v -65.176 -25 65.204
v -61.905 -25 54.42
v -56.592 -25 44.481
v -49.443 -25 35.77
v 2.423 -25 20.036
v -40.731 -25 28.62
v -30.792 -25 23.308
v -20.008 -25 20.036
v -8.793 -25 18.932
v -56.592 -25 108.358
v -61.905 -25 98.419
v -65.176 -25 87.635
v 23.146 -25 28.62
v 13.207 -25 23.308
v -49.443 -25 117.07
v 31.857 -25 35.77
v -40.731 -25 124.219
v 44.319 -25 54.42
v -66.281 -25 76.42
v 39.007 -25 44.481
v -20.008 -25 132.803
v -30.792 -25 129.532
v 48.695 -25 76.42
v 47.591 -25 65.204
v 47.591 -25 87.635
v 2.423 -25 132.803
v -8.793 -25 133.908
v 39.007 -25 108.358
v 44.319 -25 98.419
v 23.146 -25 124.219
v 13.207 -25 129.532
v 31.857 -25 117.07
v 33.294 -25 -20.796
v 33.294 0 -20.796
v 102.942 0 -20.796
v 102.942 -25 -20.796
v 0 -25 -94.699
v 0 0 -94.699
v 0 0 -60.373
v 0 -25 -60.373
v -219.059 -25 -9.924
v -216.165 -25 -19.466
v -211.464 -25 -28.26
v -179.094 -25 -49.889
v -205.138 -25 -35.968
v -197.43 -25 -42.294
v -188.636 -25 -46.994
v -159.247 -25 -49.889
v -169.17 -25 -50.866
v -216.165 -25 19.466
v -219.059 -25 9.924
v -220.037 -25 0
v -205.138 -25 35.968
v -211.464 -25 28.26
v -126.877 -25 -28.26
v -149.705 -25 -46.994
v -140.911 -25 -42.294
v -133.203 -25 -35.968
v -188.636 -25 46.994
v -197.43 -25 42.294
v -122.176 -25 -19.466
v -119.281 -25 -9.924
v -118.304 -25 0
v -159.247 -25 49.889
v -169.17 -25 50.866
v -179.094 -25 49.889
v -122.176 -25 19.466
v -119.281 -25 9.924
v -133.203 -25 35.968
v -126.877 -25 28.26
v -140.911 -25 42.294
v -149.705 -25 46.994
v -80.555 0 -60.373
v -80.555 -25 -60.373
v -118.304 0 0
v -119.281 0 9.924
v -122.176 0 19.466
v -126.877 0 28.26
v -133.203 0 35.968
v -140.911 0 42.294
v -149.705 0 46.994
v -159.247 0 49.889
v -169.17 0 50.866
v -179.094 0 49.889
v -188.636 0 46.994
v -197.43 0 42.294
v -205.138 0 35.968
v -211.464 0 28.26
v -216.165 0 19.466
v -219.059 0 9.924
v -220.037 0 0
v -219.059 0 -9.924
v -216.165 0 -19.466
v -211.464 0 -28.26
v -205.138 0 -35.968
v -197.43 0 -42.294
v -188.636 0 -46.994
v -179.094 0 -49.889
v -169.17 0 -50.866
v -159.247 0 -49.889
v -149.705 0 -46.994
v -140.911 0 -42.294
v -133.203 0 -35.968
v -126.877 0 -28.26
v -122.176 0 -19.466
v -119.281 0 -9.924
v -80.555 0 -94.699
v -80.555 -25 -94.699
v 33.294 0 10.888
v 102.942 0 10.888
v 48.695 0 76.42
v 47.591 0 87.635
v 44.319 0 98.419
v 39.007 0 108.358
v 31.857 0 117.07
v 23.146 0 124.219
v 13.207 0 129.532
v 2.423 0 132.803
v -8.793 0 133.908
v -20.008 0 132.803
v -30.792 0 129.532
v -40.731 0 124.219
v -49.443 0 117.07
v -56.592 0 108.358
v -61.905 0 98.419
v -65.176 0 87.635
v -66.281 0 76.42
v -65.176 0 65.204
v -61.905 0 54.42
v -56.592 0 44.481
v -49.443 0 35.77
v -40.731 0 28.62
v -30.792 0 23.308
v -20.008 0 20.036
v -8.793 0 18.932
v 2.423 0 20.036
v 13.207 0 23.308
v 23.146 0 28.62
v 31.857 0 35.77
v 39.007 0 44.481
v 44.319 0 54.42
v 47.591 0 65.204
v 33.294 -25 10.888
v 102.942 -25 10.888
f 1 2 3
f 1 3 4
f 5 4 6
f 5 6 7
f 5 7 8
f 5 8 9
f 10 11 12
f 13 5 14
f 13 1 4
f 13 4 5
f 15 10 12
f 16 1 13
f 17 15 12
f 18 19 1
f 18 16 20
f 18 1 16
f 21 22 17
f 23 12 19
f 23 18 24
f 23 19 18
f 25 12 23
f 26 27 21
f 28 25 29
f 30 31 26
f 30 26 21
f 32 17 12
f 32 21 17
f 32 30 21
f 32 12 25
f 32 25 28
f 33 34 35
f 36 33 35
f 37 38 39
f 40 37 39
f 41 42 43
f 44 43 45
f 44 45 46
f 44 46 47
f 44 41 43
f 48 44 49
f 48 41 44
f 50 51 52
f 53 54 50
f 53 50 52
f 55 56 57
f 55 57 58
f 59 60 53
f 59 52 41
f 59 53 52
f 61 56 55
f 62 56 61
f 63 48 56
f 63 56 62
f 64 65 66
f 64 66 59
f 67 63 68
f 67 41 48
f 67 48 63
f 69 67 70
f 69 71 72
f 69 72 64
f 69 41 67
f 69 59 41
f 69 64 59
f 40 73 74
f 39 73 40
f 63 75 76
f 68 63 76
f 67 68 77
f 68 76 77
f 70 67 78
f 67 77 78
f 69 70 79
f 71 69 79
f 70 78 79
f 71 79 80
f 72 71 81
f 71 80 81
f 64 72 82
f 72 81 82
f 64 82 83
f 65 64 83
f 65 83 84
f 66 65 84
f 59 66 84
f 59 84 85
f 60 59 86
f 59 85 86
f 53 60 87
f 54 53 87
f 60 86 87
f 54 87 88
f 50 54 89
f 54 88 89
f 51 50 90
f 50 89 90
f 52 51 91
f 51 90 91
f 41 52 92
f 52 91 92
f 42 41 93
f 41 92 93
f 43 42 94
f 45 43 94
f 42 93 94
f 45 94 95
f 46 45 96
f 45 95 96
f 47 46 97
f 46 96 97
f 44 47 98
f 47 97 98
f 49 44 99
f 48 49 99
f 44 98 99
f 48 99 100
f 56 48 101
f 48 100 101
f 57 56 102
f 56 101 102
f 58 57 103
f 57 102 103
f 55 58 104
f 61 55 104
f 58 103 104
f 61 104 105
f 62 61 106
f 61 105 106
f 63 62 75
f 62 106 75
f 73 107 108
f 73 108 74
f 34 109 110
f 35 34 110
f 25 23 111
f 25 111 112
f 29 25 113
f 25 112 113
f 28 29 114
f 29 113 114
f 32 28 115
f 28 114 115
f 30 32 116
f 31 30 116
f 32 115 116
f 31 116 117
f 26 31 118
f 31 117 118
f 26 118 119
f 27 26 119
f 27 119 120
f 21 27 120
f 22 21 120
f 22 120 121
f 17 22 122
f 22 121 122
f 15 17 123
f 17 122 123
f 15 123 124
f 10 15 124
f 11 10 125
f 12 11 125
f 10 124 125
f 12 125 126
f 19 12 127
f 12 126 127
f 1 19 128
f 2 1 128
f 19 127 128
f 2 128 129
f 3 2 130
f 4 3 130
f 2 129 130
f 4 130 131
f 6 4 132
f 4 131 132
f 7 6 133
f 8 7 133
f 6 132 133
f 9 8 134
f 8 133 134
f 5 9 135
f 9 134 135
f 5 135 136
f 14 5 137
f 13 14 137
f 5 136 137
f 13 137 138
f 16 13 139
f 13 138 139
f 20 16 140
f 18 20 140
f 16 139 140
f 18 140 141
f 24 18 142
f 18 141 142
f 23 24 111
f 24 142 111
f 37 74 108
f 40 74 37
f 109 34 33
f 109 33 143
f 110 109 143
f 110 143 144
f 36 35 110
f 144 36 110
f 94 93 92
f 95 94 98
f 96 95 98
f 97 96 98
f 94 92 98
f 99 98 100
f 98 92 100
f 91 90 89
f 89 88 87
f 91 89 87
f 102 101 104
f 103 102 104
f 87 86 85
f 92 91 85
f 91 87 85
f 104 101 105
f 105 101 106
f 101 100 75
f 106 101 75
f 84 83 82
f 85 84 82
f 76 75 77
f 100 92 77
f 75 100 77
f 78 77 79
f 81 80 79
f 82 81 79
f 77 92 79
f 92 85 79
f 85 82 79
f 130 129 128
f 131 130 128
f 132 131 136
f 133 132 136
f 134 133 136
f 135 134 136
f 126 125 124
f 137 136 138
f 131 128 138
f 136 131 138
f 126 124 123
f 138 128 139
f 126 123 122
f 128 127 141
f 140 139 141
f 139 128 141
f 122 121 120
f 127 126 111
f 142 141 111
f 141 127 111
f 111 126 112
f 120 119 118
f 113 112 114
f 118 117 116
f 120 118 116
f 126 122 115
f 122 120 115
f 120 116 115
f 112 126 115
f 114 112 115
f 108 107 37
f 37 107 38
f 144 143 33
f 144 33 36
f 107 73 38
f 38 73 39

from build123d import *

# Parameters (mm, degrees)
F0_R     = 50.866382
F0_R_2   = 57.48797
F2_W     = 69.648493
F2_H     = 31.684121
F1_W     = 80.554798
F1_H     = 34.325894
F3_DEPTH = 25


with BuildPart() as f3:
    # F0 (on Front) + F2 (on Front) + F1 (on Front) → F3 (new body)
    with BuildSketch(Plane.XZ):
        with Locations((-169.170484, 0)):
            Circle(F0_R)
        with Locations((-8.792641, 76.419741)):
            Circle(F0_R_2)
    with BuildSketch(Plane.XZ):
        with Locations((68.117959, -4.954)):
            Rectangle(F2_W, F2_H)
    with BuildSketch(Plane.XZ):
        with Locations((-40.277399, -77.536086)):
            Rectangle(F1_W, F1_H)
    extrude(amount=F3_DEPTH)


solid = f3.part
